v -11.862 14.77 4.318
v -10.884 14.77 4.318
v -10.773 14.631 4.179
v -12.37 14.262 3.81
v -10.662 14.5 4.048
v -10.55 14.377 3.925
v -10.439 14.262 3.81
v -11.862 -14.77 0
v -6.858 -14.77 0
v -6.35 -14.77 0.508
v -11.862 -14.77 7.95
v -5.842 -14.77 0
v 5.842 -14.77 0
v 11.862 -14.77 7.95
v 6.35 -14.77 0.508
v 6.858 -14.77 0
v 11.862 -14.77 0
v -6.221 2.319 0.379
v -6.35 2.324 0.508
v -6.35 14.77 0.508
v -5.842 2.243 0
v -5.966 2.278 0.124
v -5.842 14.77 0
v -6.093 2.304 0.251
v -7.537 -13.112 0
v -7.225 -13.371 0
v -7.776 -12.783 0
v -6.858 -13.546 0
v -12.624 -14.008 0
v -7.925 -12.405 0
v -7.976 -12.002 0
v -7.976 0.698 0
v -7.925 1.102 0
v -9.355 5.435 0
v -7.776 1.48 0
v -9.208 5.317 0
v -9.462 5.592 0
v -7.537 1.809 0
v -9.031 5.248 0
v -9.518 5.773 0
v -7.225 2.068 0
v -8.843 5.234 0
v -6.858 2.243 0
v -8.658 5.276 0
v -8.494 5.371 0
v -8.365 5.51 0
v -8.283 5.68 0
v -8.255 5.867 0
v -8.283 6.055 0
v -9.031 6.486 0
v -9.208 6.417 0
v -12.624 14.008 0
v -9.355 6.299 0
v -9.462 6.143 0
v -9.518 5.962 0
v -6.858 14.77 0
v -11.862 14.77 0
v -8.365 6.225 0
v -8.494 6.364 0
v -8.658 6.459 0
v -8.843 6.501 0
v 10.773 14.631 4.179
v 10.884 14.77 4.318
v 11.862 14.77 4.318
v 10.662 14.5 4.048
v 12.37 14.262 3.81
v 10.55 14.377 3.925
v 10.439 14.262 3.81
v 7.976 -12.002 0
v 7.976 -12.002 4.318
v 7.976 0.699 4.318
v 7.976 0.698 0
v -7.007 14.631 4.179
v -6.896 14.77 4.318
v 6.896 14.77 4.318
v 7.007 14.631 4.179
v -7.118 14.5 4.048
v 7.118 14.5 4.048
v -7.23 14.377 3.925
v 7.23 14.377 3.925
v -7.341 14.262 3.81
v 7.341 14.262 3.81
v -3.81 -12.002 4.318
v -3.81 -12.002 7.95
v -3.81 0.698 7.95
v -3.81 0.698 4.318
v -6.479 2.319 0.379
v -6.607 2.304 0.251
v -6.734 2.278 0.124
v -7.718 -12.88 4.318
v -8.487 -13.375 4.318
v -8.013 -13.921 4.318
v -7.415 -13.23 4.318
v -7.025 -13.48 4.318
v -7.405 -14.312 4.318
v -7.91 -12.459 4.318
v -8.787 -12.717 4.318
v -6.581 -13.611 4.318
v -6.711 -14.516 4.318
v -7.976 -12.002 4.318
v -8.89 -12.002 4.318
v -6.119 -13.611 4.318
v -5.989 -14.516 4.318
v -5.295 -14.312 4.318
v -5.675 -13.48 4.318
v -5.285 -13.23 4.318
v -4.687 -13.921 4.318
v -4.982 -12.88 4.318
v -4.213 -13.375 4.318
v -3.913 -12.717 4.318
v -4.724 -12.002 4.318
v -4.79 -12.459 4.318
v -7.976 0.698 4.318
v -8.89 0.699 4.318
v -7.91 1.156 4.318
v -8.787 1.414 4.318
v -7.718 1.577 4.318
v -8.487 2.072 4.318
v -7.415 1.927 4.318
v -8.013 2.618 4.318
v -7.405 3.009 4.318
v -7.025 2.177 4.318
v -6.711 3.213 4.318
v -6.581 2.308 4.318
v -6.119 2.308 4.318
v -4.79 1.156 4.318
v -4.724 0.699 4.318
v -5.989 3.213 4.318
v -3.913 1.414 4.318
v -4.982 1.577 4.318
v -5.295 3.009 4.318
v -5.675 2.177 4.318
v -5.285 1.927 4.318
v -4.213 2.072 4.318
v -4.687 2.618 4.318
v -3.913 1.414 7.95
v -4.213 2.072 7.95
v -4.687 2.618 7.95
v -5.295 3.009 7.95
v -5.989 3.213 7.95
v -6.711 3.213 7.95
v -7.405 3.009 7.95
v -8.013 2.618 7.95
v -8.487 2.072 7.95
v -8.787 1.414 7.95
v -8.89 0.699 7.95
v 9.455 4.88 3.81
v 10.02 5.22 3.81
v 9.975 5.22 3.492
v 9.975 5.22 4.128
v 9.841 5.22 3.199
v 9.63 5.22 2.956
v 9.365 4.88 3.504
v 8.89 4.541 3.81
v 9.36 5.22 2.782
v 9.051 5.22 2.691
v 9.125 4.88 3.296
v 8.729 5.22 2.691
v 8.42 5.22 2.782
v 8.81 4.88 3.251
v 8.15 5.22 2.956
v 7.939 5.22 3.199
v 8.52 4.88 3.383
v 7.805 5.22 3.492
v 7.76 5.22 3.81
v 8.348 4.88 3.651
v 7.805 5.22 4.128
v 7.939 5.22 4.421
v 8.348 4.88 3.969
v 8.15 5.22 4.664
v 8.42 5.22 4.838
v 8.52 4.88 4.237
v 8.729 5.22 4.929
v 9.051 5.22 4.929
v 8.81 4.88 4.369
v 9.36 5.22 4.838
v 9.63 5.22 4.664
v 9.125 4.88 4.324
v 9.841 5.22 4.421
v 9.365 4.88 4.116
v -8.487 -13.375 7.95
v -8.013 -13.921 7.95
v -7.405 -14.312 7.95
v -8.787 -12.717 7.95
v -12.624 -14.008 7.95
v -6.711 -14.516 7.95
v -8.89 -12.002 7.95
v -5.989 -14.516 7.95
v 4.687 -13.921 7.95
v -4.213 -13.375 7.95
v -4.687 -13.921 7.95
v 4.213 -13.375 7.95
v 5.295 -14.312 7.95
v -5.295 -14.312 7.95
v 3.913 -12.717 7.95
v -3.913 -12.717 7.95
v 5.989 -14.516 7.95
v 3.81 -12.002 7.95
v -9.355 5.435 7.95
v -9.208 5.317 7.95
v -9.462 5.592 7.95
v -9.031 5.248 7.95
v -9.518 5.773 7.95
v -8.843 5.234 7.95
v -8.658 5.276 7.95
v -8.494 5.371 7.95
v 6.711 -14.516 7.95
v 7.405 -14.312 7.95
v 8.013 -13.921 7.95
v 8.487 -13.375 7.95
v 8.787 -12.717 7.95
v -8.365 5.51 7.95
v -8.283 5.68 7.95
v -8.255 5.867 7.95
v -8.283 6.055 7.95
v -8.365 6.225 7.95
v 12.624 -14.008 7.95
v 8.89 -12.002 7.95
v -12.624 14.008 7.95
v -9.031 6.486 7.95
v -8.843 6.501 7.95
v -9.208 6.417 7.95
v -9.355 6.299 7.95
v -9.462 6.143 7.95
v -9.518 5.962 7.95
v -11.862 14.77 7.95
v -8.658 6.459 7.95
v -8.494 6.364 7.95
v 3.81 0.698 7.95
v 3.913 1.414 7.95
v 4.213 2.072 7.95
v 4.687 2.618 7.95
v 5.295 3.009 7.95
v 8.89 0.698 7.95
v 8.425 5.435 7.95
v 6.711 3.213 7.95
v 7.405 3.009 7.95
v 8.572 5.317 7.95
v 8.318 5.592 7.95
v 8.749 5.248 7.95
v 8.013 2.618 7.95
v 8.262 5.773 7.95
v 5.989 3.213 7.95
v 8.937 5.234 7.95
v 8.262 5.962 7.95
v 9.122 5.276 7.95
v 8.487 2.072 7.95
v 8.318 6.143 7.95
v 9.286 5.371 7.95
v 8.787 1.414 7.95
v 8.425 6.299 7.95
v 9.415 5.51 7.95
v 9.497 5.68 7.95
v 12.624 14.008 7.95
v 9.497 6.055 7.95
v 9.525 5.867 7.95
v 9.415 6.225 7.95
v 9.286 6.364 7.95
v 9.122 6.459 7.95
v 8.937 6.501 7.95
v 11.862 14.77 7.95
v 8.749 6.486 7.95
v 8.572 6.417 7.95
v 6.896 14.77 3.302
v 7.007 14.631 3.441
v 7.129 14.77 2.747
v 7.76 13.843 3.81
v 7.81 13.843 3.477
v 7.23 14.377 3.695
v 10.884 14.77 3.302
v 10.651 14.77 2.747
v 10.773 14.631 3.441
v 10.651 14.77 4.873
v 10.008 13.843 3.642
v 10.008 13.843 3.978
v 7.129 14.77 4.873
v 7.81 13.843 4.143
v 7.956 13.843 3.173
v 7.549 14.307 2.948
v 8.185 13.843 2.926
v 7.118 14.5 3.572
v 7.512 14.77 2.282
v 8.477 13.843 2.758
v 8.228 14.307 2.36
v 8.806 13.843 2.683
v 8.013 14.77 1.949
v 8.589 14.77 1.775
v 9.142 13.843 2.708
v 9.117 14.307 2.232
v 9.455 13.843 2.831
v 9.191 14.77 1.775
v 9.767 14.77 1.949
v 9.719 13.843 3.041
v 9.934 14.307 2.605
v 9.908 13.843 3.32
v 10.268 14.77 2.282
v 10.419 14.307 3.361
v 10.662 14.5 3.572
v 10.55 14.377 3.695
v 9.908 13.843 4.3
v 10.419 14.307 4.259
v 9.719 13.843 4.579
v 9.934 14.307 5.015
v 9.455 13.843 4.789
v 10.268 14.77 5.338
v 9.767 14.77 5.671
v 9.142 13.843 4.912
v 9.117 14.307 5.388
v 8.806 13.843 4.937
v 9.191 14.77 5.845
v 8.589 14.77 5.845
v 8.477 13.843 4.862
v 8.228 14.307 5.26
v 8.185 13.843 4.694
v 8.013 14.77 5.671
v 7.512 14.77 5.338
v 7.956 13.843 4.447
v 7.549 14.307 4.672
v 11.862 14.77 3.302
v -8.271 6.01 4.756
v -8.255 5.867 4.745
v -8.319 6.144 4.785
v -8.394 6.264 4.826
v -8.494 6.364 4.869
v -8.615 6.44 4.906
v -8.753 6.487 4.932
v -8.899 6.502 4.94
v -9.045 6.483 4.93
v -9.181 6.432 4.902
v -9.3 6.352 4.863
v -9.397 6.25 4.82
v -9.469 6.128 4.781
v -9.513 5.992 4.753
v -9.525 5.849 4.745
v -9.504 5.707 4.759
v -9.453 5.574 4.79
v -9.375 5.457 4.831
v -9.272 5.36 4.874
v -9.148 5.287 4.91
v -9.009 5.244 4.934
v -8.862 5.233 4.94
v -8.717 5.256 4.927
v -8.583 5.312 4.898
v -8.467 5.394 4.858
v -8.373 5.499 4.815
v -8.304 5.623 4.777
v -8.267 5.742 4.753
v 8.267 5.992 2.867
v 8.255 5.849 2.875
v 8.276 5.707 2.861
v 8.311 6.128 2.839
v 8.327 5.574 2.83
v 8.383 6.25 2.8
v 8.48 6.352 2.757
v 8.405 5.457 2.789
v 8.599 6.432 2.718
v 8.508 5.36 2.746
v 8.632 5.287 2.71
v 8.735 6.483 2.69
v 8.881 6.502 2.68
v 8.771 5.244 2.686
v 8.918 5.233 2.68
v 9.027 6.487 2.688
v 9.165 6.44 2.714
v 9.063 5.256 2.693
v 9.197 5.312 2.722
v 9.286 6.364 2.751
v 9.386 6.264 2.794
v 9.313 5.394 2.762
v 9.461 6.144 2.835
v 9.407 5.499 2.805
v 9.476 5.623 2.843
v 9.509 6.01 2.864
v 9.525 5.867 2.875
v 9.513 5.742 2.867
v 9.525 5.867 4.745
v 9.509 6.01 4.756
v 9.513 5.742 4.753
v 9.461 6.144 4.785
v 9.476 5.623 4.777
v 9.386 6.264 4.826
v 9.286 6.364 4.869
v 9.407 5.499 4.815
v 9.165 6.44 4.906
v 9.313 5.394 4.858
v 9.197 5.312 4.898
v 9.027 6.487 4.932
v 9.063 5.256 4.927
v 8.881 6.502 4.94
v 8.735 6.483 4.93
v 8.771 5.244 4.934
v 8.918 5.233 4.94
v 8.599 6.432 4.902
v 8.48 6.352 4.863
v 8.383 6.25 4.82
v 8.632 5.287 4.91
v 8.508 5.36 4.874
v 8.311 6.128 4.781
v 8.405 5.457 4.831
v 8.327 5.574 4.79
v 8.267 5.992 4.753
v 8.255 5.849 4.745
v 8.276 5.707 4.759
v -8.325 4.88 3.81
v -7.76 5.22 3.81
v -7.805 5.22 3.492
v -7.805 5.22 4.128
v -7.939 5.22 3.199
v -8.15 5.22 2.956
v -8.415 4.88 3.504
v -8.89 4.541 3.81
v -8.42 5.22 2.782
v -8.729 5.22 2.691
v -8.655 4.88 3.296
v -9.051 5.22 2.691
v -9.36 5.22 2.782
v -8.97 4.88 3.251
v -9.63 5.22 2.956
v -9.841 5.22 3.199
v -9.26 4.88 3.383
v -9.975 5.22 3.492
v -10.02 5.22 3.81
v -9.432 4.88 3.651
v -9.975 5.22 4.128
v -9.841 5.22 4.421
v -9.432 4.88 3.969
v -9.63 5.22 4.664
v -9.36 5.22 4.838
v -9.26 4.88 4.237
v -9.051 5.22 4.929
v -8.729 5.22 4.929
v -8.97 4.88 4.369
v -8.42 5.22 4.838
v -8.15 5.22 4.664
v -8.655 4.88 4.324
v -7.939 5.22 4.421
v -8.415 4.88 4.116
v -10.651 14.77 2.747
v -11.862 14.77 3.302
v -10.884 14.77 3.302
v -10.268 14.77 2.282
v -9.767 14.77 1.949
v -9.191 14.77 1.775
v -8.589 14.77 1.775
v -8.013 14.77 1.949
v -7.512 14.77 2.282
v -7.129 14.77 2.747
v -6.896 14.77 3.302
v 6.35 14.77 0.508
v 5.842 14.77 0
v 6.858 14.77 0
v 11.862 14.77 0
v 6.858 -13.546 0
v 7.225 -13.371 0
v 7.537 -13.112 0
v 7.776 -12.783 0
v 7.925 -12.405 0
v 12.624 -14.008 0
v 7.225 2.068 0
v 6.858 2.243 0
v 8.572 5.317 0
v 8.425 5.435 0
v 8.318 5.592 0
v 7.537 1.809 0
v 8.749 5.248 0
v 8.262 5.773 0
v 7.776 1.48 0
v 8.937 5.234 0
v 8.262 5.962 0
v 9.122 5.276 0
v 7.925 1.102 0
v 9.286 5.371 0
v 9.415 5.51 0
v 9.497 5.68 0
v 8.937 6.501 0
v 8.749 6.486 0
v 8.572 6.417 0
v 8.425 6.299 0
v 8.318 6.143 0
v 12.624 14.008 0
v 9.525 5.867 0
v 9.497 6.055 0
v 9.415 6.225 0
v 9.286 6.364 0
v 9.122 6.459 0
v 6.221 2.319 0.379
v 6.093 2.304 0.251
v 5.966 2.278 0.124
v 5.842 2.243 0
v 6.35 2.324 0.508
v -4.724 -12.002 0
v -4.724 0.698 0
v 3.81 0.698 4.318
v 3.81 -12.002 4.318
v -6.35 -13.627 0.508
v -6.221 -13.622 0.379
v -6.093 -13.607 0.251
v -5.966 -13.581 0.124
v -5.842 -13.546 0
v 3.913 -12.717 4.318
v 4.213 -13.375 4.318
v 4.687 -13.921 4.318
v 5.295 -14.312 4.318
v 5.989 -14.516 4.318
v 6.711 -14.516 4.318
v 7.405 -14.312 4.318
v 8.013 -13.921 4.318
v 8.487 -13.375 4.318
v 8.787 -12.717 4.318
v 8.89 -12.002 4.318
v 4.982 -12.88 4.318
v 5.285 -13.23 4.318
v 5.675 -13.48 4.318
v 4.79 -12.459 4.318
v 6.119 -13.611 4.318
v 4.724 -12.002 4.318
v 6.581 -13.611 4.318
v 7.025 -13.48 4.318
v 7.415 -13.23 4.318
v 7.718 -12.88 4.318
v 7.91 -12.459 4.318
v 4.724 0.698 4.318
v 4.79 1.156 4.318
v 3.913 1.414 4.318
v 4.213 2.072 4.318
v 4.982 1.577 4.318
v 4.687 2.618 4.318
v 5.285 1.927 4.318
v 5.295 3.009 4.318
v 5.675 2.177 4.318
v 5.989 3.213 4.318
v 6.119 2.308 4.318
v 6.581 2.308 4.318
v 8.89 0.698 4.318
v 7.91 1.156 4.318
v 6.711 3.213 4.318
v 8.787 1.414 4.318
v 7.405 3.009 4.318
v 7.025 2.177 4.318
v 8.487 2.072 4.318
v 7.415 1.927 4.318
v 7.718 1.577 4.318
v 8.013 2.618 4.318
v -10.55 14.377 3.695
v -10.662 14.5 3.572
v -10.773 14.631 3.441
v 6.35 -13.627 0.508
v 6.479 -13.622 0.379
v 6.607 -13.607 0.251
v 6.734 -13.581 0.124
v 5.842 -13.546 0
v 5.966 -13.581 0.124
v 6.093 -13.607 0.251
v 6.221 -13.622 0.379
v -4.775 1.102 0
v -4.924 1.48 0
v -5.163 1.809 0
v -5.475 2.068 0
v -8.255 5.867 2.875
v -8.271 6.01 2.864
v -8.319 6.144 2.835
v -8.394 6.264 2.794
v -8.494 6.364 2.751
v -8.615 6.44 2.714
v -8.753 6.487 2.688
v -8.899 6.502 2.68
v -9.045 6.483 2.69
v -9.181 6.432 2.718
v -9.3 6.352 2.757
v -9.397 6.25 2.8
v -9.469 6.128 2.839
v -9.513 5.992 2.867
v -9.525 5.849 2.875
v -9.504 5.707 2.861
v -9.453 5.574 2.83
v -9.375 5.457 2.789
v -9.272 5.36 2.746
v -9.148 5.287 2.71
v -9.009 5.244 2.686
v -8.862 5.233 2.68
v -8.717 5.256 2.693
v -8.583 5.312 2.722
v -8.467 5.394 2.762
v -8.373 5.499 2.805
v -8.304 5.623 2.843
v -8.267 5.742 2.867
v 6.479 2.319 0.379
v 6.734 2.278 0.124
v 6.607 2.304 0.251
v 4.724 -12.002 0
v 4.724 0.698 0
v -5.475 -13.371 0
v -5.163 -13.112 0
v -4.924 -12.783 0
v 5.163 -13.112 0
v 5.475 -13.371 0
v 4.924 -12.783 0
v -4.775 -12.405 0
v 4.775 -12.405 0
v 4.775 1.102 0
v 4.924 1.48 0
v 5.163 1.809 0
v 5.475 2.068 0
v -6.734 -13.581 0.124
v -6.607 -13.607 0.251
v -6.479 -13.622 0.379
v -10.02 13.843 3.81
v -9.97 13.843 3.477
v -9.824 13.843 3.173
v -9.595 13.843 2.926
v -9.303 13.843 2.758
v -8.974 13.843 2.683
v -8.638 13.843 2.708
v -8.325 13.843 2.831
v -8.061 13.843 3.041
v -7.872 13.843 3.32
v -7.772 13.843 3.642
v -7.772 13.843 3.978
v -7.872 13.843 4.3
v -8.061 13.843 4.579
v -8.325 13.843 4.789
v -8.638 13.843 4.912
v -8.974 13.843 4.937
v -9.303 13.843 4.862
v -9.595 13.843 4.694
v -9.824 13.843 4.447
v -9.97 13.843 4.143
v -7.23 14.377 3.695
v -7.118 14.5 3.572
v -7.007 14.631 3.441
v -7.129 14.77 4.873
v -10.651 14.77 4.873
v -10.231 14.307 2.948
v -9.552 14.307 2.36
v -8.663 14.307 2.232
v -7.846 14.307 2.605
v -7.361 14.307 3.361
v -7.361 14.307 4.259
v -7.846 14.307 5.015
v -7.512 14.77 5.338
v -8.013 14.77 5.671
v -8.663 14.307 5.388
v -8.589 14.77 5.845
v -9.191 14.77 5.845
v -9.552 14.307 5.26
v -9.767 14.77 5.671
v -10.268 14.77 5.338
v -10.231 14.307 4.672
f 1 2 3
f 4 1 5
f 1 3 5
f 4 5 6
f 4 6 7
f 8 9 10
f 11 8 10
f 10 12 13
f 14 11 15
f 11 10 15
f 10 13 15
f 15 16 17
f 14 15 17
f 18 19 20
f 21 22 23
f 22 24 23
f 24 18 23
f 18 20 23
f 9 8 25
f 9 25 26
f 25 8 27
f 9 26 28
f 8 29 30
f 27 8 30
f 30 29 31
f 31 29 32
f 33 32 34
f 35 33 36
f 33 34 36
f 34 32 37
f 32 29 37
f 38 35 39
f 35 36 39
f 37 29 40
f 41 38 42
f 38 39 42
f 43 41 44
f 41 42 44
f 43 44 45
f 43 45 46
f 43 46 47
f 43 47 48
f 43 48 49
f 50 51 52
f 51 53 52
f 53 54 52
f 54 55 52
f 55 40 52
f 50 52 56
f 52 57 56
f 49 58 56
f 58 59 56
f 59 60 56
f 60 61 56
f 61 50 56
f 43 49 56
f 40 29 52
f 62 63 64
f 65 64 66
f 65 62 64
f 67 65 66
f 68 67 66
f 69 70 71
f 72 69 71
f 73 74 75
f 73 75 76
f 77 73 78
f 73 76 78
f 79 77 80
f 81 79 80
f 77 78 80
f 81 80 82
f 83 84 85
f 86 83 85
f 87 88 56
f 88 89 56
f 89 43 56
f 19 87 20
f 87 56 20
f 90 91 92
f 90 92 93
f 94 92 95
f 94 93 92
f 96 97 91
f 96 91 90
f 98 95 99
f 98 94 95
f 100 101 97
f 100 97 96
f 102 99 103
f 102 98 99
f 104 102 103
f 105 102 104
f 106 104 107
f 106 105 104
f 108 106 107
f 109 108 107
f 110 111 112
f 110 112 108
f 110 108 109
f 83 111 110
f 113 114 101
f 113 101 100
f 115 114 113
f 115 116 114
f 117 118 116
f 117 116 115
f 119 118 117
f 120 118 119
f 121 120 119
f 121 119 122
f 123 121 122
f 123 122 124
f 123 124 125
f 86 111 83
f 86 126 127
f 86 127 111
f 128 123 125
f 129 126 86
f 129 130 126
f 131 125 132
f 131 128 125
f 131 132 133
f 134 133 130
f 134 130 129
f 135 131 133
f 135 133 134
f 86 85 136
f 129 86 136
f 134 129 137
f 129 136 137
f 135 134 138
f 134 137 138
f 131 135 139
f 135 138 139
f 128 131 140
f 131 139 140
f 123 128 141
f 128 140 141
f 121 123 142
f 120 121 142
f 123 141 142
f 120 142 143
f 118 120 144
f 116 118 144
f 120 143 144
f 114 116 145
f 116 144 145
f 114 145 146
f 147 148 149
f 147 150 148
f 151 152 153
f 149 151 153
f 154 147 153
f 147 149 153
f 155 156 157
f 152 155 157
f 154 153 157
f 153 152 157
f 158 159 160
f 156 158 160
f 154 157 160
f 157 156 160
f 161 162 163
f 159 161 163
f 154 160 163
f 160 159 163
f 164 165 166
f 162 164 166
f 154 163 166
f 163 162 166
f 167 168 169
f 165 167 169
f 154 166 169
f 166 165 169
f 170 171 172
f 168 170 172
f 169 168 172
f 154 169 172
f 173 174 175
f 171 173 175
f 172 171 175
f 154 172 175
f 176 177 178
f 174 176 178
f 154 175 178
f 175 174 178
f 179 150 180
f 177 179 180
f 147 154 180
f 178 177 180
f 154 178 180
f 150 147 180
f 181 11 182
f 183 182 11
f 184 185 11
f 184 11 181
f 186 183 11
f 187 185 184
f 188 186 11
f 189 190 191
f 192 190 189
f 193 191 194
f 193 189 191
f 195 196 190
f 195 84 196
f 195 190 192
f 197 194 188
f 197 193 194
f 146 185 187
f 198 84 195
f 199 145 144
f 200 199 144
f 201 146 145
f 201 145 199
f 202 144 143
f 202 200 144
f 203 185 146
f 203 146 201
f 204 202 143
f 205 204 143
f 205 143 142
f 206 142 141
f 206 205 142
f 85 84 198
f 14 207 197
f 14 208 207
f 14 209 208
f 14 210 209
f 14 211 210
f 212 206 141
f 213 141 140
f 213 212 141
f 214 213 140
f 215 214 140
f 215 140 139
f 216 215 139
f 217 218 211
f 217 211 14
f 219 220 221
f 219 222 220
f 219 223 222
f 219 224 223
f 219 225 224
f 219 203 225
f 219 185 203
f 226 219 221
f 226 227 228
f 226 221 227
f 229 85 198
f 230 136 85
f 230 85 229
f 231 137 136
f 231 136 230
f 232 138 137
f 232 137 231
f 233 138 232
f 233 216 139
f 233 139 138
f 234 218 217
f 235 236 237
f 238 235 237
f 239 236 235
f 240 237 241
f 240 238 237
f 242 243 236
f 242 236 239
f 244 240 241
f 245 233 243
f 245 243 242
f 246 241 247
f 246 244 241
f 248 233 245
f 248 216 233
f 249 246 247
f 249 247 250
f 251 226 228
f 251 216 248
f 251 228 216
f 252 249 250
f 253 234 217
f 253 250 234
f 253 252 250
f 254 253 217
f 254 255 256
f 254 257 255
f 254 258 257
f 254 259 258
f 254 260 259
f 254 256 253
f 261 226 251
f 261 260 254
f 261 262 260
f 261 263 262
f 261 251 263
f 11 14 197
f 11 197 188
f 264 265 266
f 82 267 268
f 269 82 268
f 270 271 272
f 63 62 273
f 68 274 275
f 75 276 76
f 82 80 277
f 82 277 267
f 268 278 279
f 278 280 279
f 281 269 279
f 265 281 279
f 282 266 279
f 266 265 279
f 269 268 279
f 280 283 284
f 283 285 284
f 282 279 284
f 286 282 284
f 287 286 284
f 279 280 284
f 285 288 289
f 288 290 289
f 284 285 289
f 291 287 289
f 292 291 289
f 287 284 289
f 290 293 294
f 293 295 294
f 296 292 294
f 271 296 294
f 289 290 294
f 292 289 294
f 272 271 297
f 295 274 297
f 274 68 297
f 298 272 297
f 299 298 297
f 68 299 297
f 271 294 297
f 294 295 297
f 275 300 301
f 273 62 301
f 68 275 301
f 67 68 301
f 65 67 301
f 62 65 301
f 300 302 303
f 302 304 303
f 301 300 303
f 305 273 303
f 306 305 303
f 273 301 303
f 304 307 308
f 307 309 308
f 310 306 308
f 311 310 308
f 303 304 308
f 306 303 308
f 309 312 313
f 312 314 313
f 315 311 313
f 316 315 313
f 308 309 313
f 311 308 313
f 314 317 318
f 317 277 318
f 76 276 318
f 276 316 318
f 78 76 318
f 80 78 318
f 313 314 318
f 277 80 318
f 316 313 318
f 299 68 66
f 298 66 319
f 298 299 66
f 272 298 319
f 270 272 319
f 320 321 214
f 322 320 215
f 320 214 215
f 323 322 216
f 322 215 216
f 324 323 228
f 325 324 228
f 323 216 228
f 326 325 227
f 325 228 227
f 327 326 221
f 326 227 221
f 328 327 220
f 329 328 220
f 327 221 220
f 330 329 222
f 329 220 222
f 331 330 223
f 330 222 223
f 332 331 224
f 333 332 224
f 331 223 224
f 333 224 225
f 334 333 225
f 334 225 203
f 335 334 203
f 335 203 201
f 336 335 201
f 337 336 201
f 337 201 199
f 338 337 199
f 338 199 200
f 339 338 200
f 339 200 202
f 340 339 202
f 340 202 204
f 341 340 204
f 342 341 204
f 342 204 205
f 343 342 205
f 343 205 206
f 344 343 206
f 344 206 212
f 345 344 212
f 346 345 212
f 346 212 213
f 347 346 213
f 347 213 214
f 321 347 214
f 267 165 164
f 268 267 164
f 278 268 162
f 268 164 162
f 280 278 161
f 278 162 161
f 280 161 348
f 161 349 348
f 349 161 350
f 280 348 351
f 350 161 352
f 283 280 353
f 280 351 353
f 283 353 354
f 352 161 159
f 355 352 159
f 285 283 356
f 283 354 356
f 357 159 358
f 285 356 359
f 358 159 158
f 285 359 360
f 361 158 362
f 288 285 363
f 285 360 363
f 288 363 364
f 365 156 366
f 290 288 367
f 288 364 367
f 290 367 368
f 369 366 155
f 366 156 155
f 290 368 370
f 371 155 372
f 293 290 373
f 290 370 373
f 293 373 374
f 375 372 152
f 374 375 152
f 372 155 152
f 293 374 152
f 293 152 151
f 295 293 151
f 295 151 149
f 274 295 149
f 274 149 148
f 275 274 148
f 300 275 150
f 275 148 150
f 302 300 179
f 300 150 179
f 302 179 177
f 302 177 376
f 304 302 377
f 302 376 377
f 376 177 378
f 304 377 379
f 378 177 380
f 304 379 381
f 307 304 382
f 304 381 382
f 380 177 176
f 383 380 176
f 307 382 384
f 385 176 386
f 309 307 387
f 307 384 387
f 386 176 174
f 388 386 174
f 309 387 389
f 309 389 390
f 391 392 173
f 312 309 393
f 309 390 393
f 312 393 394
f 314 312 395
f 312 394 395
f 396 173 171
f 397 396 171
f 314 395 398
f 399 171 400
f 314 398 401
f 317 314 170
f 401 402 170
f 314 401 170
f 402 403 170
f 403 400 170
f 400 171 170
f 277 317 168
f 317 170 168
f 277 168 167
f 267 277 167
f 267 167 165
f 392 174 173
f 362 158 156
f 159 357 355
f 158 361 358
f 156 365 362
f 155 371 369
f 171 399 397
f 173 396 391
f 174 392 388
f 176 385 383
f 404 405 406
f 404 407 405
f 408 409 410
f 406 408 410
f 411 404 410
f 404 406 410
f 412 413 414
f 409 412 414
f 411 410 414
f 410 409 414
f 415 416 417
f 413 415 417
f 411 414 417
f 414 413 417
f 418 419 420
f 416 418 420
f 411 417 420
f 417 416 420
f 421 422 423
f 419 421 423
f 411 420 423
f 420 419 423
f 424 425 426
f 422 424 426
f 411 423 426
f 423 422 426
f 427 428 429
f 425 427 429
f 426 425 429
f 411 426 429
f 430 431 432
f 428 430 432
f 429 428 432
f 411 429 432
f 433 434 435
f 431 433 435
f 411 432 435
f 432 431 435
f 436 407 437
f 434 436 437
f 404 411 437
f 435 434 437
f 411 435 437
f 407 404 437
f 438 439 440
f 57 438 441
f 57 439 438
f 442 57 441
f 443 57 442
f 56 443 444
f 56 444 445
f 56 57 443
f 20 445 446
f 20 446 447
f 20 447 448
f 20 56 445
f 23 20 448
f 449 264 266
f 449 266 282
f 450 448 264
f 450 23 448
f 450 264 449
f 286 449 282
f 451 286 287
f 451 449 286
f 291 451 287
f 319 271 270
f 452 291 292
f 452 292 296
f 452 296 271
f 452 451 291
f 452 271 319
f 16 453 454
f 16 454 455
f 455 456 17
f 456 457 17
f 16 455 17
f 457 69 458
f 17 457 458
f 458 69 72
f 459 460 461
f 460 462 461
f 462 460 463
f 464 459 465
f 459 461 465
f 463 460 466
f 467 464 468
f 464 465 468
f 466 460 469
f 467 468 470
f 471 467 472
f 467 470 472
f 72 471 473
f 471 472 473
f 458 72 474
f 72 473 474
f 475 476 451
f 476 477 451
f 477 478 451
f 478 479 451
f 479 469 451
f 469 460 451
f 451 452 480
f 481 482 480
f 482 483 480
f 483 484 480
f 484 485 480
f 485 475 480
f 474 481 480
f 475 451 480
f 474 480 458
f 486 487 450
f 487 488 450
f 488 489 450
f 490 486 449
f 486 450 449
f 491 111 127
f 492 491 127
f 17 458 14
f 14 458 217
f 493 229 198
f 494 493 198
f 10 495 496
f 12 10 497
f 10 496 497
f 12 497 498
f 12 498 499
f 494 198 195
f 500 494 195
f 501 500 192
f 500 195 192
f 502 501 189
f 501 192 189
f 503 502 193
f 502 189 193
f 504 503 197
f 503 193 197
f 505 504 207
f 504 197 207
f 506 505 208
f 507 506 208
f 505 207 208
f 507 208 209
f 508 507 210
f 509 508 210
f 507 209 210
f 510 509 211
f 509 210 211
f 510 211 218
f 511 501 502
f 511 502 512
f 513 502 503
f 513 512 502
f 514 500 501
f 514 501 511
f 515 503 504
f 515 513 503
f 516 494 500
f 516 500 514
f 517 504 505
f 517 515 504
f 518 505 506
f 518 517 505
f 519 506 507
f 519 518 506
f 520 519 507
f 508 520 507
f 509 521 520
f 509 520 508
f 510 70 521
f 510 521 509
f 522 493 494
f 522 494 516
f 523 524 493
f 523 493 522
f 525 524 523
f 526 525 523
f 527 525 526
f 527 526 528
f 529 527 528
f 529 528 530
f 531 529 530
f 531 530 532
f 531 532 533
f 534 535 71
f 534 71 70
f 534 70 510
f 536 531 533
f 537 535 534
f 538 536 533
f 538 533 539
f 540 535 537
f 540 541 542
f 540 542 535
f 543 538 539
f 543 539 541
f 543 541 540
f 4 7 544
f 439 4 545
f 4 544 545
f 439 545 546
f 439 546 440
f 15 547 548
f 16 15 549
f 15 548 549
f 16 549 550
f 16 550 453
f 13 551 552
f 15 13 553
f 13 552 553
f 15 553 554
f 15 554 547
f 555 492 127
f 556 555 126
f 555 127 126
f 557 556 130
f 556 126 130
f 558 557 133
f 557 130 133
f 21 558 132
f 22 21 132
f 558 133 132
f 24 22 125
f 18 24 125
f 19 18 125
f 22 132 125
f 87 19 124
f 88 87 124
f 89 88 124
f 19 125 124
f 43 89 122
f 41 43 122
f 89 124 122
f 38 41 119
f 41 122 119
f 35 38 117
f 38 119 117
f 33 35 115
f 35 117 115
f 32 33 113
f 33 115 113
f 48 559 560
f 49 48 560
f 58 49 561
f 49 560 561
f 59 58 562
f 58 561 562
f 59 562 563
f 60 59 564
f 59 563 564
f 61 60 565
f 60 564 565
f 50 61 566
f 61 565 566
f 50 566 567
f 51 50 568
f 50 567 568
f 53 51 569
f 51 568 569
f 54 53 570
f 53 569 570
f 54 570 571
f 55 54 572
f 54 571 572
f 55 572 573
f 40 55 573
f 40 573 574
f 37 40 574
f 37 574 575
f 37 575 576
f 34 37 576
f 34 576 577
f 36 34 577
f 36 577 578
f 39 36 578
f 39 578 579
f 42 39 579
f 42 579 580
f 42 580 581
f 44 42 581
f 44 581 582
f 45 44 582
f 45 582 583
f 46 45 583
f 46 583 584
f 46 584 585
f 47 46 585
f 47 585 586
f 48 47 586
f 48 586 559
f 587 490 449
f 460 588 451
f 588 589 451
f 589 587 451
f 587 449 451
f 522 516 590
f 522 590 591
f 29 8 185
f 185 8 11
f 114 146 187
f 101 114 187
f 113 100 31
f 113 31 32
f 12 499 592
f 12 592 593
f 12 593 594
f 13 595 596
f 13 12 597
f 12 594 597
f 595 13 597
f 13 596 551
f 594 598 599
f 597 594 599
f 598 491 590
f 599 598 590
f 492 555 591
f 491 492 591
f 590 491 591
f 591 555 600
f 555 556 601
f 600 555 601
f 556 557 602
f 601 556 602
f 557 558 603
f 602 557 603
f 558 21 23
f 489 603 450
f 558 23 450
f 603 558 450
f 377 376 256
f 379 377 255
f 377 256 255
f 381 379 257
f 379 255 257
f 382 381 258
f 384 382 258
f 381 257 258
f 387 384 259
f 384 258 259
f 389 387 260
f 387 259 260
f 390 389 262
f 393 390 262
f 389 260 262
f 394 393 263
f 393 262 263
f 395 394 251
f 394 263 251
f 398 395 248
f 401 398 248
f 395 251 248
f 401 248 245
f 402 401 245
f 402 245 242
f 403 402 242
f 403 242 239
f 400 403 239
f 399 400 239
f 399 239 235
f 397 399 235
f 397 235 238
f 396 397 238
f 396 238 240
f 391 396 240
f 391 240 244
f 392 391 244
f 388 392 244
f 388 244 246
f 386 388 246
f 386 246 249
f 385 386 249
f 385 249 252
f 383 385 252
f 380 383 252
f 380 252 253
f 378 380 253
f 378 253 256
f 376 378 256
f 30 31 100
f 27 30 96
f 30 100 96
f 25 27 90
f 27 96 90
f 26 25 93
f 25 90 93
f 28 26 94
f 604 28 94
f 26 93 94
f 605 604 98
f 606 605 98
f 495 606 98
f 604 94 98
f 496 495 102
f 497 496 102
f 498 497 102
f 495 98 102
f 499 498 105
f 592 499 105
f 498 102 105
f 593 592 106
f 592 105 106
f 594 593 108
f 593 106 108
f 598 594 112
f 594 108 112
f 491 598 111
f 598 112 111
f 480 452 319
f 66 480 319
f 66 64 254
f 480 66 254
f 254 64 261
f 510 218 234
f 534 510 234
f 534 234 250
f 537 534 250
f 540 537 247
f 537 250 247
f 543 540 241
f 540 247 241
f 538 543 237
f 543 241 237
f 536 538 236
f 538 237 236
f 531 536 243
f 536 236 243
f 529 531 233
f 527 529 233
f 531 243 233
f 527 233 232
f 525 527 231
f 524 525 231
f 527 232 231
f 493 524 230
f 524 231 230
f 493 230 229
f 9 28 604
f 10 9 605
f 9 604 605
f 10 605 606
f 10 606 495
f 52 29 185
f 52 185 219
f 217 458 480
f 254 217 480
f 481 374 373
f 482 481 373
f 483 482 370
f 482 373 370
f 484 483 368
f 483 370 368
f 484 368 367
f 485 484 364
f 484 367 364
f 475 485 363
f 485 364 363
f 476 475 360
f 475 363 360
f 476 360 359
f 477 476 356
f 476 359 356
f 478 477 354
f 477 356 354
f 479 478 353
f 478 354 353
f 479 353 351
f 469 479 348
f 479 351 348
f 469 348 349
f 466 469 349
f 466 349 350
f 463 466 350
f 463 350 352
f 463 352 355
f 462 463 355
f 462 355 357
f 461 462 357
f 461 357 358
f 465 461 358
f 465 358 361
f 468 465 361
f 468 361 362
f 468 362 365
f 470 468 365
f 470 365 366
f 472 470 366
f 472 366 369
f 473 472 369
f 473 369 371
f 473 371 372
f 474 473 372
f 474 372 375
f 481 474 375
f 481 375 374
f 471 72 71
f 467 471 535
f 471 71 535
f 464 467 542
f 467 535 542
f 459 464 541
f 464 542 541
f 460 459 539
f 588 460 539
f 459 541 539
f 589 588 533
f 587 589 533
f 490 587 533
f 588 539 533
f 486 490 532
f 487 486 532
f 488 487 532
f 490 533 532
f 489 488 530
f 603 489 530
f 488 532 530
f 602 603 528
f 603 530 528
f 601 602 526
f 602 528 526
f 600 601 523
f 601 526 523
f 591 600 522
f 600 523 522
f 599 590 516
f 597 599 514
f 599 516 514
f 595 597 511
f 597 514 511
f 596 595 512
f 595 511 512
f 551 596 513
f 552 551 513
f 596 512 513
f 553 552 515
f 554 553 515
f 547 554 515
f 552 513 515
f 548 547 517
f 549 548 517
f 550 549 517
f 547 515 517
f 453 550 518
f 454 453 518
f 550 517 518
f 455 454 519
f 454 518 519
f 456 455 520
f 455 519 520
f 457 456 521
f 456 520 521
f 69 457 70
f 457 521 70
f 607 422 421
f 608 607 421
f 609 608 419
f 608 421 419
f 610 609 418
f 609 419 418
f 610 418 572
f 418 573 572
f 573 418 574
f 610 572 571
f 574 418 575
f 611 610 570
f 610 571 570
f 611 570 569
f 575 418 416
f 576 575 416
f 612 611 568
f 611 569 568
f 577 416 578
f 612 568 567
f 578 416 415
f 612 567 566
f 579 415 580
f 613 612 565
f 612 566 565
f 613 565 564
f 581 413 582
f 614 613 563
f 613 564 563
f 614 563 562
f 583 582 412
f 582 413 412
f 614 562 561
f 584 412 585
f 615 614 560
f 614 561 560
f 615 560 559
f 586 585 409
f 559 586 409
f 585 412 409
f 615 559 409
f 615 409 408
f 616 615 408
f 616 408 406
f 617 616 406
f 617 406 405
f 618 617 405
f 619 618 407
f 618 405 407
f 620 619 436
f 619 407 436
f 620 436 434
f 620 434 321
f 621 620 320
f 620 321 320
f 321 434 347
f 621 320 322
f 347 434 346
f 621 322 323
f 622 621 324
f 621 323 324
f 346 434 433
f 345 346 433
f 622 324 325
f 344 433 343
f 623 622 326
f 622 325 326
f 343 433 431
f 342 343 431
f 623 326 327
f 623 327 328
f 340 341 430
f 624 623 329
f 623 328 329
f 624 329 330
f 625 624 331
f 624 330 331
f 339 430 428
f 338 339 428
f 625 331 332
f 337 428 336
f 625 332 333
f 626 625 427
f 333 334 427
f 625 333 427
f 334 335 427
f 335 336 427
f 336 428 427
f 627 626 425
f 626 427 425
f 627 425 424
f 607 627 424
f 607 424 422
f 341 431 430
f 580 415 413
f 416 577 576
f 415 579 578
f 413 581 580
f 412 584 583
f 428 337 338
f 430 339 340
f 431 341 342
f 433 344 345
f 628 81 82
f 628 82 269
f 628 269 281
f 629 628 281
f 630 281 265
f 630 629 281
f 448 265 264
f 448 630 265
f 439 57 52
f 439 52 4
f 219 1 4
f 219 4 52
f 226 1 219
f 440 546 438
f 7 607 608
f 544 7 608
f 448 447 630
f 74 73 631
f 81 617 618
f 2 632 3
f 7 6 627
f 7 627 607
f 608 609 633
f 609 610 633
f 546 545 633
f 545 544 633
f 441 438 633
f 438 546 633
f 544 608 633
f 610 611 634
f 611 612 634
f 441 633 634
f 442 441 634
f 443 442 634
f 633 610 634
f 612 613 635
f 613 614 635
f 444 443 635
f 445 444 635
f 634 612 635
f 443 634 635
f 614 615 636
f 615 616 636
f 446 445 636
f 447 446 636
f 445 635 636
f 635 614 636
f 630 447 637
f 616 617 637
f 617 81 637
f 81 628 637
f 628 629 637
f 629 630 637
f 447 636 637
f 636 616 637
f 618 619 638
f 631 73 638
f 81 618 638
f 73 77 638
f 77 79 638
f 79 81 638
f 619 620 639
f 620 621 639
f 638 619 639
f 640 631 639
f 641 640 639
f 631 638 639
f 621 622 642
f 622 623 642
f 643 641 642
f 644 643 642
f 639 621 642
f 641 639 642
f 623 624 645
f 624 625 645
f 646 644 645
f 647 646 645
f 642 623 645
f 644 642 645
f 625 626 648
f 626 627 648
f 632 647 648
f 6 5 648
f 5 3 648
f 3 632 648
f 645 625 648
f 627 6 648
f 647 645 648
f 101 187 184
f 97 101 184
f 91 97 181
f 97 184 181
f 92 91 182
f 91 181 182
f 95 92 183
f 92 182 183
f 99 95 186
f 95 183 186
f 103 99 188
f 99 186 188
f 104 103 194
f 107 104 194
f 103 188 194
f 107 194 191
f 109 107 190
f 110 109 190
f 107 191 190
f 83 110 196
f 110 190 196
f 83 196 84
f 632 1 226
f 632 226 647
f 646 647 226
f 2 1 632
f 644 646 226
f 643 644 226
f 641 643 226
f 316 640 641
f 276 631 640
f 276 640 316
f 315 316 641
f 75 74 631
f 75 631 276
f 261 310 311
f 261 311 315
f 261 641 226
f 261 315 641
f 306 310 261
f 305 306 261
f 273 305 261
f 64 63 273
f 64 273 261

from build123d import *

# Parameters (mm, degrees)
SKETCH1_W                       = 25.2476
SKETCH1_H                       = 29.5402
BOSS_EXTRUDE1_DEPTH             = 7.9502
CHAMFER1_SIZE                   = 0.762
CUT_EXTRUDE1_DEPTH              = 30.5402
F_4_40_TAPPED_HOLE1_D           = 2.2606
F_4_40_TAPPED_HOLE1_DEPTH       = 9.5504
F_4_40_TAPPED_HOLE1_CSINK_D     = 4.1148
F_4_40_TAPPED_HOLE1_CSINK_ANGLE = 90
F_4_40_TAPPED_HOLE1_TIP         = 0.679152758
SKETCH6_R                       = 1.6256
SKETCH6_W                       = 3.2512
SKETCH6_H                       = 12.7
CUT_EXTRUDE3_DEPTH              = 8.9502
CUT_EXTRUDE4_DEPTH              = 3.6322
SKETCH11_R                      = 0.635
CUT_EXTRUDE5_DEPTH              = 8.9502
CUT_EXTRUDE7_DEPTH              = 13.6238
CUT_EXTRUDE7_DEPTH_BACK         = 13.6238


with BuildPart() as part:
    # Sketch1 → Boss-Extrude1 (new body)
    with BuildSketch(Plane.XY):
        Rectangle(SKETCH1_W, SKETCH1_H)
    extrude(amount=BOSS_EXTRUDE1_DEPTH)

    # Chamfer1
    chamfer1_edges = [part.edges().sort_by_distance(p)[0] for p in [
        (12.6238, -14.7701, 3.9751),
        (-12.6238, -14.7701, 3.9751),
        (-12.6238, 14.7701, 3.9751),
        (12.6238, 14.7701, 3.9751),
    ]]
    chamfer(chamfer1_edges, length=CHAMFER1_SIZE)

    # Sketch2 → Cut-Extrude1 (cut, through all)
    with BuildSketch(Plane(origin=(0, 14.7701, 0), x_dir=(1, 0, 0), z_dir=(0, 1, 0))):
        Polygon((-6.35, 0.508), (-6.858, 0), (-6.35, -0.508), (-5.842, 0), align=None)
        Polygon((5.842, 0), (6.35, -0.508), (6.858, 0), (6.35, 0.508), align=None)
    extrude(amount=-CUT_EXTRUDE1_DEPTH, mode=Mode.SUBTRACT)

    # #4-40 Tapped Hole1
    with Locations(Plane(origin=(0, 14.7701, 0), x_dir=(1, 0, 0), z_dir=(0, 1, 0))):
        with Locations((-8.89, -3.81), (8.89, -3.81)):
            CounterSinkHole(F_4_40_TAPPED_HOLE1_D / 2, F_4_40_TAPPED_HOLE1_CSINK_D / 2, depth=F_4_40_TAPPED_HOLE1_DEPTH, counter_sink_angle=F_4_40_TAPPED_HOLE1_CSINK_ANGLE)
            with Locations((0, 0, -(F_4_40_TAPPED_HOLE1_DEPTH + F_4_40_TAPPED_HOLE1_TIP / 2))):  # 118° drill point
                Cone(0, F_4_40_TAPPED_HOLE1_D / 2, F_4_40_TAPPED_HOLE1_TIP, mode=Mode.SUBTRACT)

    # Sketch6 → Cut-Extrude3 (cut, through all)
    with BuildSketch(Plane.XY.offset(7.9502)):
        with Locations((-6.35, 0.6985)):
            Circle(SKETCH6_R)
        with Locations((-6.35, -12.0015)):
            Circle(SKETCH6_R)
        with Locations((6.35, -12.0015)):
            Circle(SKETCH6_R)
        with Locations((6.35, 0.6985)):
            Circle(SKETCH6_R)
        with Locations((-6.35, -5.6515)):
            Rectangle(SKETCH6_W, SKETCH6_H)
        with Locations((6.35, -5.6515)):
            Rectangle(SKETCH6_W, SKETCH6_H)
    extrude(amount=-CUT_EXTRUDE3_DEPTH, mode=Mode.SUBTRACT)

    # Sketch8 → Cut-Extrude4 (cut)
    with BuildSketch(Plane.XY.offset(7.9502)):
        with BuildLine():
            ThreePointArc((8.89, 0.6985), (6.35, 3.2385), (3.81, 0.6985))
            Line((3.81, 0.6985), (3.81, -12.0015))
            ThreePointArc((3.81, -12.0015), (6.35, -14.5415), (8.89, -12.0015))
            Line((8.89, -12.0015), (8.89, 0.6985))
        make_face()
        with BuildLine():
            Line((4.7244, -12.0015), (4.7244, 0.6985))
            ThreePointArc((4.7244, 0.6985), (6.35, 2.3241), (7.9756, 0.6985))
            Line((7.9756, 0.6985), (7.9756, -12.0015))
            ThreePointArc((7.9756, -12.0015), (6.35, -13.6271), (4.7244, -12.0015))
        make_face(mode=Mode.SUBTRACT)
        with BuildLine():
            Line((-3.81, -12.0015), (-3.81, 0.6985))
            ThreePointArc((-3.81, 0.6985), (-6.35, 3.2385), (-8.89, 0.6985))
            Line((-8.89, 0.6985), (-8.89, -12.0015))
            ThreePointArc((-8.89, -12.0015), (-6.35, -14.5415), (-3.81, -12.0015))
        make_face()
        with BuildLine():
            ThreePointArc((-7.9756, 0.6985), (-6.35, 2.3241), (-4.7244, 0.6985))
            Line((-4.7244, 0.6985), (-4.7244, -12.0015))
            ThreePointArc((-4.7244, -12.0015), (-6.35, -13.6271), (-7.9756, -12.0015))
            Line((-7.9756, -12.0015), (-7.9756, 0.6985))
        make_face(mode=Mode.SUBTRACT)
    extrude(amount=-CUT_EXTRUDE4_DEPTH, mode=Mode.SUBTRACT)

    # Sketch11 → Cut-Extrude5 (cut, through all)
    with BuildSketch(Plane.XY.offset(7.9502)):
        with Locations((-8.89, 5.8674)):
            Circle(SKETCH11_R)
        with Locations((8.89, 5.8674)):
            Circle(SKETCH11_R)
    extrude(amount=-CUT_EXTRUDE5_DEPTH, mode=Mode.SUBTRACT)

    # Sketch15 → Cut-Extrude7 (cut, two sides)
    with BuildSketch(Plane(origin=(0, 0, 0), x_dir=(0, 0, -1), z_dir=(1, 0, 0))) as cut_extrude7_sk:
        Polygon((-53.679236414, 64.131336414), (-4.318, 14.7701), (-3.81, 14.2621), (-3.302, 14.7701), (46.059236414, 64.131336414), (46.059236414, 203.745996399), (-53.679236414, 203.745996399), align=None)
    extrude(amount=CUT_EXTRUDE7_DEPTH, mode=Mode.SUBTRACT)
    extrude(cut_extrude7_sk.sketch, amount=-CUT_EXTRUDE7_DEPTH_BACK, mode=Mode.SUBTRACT)


solid = part.part
